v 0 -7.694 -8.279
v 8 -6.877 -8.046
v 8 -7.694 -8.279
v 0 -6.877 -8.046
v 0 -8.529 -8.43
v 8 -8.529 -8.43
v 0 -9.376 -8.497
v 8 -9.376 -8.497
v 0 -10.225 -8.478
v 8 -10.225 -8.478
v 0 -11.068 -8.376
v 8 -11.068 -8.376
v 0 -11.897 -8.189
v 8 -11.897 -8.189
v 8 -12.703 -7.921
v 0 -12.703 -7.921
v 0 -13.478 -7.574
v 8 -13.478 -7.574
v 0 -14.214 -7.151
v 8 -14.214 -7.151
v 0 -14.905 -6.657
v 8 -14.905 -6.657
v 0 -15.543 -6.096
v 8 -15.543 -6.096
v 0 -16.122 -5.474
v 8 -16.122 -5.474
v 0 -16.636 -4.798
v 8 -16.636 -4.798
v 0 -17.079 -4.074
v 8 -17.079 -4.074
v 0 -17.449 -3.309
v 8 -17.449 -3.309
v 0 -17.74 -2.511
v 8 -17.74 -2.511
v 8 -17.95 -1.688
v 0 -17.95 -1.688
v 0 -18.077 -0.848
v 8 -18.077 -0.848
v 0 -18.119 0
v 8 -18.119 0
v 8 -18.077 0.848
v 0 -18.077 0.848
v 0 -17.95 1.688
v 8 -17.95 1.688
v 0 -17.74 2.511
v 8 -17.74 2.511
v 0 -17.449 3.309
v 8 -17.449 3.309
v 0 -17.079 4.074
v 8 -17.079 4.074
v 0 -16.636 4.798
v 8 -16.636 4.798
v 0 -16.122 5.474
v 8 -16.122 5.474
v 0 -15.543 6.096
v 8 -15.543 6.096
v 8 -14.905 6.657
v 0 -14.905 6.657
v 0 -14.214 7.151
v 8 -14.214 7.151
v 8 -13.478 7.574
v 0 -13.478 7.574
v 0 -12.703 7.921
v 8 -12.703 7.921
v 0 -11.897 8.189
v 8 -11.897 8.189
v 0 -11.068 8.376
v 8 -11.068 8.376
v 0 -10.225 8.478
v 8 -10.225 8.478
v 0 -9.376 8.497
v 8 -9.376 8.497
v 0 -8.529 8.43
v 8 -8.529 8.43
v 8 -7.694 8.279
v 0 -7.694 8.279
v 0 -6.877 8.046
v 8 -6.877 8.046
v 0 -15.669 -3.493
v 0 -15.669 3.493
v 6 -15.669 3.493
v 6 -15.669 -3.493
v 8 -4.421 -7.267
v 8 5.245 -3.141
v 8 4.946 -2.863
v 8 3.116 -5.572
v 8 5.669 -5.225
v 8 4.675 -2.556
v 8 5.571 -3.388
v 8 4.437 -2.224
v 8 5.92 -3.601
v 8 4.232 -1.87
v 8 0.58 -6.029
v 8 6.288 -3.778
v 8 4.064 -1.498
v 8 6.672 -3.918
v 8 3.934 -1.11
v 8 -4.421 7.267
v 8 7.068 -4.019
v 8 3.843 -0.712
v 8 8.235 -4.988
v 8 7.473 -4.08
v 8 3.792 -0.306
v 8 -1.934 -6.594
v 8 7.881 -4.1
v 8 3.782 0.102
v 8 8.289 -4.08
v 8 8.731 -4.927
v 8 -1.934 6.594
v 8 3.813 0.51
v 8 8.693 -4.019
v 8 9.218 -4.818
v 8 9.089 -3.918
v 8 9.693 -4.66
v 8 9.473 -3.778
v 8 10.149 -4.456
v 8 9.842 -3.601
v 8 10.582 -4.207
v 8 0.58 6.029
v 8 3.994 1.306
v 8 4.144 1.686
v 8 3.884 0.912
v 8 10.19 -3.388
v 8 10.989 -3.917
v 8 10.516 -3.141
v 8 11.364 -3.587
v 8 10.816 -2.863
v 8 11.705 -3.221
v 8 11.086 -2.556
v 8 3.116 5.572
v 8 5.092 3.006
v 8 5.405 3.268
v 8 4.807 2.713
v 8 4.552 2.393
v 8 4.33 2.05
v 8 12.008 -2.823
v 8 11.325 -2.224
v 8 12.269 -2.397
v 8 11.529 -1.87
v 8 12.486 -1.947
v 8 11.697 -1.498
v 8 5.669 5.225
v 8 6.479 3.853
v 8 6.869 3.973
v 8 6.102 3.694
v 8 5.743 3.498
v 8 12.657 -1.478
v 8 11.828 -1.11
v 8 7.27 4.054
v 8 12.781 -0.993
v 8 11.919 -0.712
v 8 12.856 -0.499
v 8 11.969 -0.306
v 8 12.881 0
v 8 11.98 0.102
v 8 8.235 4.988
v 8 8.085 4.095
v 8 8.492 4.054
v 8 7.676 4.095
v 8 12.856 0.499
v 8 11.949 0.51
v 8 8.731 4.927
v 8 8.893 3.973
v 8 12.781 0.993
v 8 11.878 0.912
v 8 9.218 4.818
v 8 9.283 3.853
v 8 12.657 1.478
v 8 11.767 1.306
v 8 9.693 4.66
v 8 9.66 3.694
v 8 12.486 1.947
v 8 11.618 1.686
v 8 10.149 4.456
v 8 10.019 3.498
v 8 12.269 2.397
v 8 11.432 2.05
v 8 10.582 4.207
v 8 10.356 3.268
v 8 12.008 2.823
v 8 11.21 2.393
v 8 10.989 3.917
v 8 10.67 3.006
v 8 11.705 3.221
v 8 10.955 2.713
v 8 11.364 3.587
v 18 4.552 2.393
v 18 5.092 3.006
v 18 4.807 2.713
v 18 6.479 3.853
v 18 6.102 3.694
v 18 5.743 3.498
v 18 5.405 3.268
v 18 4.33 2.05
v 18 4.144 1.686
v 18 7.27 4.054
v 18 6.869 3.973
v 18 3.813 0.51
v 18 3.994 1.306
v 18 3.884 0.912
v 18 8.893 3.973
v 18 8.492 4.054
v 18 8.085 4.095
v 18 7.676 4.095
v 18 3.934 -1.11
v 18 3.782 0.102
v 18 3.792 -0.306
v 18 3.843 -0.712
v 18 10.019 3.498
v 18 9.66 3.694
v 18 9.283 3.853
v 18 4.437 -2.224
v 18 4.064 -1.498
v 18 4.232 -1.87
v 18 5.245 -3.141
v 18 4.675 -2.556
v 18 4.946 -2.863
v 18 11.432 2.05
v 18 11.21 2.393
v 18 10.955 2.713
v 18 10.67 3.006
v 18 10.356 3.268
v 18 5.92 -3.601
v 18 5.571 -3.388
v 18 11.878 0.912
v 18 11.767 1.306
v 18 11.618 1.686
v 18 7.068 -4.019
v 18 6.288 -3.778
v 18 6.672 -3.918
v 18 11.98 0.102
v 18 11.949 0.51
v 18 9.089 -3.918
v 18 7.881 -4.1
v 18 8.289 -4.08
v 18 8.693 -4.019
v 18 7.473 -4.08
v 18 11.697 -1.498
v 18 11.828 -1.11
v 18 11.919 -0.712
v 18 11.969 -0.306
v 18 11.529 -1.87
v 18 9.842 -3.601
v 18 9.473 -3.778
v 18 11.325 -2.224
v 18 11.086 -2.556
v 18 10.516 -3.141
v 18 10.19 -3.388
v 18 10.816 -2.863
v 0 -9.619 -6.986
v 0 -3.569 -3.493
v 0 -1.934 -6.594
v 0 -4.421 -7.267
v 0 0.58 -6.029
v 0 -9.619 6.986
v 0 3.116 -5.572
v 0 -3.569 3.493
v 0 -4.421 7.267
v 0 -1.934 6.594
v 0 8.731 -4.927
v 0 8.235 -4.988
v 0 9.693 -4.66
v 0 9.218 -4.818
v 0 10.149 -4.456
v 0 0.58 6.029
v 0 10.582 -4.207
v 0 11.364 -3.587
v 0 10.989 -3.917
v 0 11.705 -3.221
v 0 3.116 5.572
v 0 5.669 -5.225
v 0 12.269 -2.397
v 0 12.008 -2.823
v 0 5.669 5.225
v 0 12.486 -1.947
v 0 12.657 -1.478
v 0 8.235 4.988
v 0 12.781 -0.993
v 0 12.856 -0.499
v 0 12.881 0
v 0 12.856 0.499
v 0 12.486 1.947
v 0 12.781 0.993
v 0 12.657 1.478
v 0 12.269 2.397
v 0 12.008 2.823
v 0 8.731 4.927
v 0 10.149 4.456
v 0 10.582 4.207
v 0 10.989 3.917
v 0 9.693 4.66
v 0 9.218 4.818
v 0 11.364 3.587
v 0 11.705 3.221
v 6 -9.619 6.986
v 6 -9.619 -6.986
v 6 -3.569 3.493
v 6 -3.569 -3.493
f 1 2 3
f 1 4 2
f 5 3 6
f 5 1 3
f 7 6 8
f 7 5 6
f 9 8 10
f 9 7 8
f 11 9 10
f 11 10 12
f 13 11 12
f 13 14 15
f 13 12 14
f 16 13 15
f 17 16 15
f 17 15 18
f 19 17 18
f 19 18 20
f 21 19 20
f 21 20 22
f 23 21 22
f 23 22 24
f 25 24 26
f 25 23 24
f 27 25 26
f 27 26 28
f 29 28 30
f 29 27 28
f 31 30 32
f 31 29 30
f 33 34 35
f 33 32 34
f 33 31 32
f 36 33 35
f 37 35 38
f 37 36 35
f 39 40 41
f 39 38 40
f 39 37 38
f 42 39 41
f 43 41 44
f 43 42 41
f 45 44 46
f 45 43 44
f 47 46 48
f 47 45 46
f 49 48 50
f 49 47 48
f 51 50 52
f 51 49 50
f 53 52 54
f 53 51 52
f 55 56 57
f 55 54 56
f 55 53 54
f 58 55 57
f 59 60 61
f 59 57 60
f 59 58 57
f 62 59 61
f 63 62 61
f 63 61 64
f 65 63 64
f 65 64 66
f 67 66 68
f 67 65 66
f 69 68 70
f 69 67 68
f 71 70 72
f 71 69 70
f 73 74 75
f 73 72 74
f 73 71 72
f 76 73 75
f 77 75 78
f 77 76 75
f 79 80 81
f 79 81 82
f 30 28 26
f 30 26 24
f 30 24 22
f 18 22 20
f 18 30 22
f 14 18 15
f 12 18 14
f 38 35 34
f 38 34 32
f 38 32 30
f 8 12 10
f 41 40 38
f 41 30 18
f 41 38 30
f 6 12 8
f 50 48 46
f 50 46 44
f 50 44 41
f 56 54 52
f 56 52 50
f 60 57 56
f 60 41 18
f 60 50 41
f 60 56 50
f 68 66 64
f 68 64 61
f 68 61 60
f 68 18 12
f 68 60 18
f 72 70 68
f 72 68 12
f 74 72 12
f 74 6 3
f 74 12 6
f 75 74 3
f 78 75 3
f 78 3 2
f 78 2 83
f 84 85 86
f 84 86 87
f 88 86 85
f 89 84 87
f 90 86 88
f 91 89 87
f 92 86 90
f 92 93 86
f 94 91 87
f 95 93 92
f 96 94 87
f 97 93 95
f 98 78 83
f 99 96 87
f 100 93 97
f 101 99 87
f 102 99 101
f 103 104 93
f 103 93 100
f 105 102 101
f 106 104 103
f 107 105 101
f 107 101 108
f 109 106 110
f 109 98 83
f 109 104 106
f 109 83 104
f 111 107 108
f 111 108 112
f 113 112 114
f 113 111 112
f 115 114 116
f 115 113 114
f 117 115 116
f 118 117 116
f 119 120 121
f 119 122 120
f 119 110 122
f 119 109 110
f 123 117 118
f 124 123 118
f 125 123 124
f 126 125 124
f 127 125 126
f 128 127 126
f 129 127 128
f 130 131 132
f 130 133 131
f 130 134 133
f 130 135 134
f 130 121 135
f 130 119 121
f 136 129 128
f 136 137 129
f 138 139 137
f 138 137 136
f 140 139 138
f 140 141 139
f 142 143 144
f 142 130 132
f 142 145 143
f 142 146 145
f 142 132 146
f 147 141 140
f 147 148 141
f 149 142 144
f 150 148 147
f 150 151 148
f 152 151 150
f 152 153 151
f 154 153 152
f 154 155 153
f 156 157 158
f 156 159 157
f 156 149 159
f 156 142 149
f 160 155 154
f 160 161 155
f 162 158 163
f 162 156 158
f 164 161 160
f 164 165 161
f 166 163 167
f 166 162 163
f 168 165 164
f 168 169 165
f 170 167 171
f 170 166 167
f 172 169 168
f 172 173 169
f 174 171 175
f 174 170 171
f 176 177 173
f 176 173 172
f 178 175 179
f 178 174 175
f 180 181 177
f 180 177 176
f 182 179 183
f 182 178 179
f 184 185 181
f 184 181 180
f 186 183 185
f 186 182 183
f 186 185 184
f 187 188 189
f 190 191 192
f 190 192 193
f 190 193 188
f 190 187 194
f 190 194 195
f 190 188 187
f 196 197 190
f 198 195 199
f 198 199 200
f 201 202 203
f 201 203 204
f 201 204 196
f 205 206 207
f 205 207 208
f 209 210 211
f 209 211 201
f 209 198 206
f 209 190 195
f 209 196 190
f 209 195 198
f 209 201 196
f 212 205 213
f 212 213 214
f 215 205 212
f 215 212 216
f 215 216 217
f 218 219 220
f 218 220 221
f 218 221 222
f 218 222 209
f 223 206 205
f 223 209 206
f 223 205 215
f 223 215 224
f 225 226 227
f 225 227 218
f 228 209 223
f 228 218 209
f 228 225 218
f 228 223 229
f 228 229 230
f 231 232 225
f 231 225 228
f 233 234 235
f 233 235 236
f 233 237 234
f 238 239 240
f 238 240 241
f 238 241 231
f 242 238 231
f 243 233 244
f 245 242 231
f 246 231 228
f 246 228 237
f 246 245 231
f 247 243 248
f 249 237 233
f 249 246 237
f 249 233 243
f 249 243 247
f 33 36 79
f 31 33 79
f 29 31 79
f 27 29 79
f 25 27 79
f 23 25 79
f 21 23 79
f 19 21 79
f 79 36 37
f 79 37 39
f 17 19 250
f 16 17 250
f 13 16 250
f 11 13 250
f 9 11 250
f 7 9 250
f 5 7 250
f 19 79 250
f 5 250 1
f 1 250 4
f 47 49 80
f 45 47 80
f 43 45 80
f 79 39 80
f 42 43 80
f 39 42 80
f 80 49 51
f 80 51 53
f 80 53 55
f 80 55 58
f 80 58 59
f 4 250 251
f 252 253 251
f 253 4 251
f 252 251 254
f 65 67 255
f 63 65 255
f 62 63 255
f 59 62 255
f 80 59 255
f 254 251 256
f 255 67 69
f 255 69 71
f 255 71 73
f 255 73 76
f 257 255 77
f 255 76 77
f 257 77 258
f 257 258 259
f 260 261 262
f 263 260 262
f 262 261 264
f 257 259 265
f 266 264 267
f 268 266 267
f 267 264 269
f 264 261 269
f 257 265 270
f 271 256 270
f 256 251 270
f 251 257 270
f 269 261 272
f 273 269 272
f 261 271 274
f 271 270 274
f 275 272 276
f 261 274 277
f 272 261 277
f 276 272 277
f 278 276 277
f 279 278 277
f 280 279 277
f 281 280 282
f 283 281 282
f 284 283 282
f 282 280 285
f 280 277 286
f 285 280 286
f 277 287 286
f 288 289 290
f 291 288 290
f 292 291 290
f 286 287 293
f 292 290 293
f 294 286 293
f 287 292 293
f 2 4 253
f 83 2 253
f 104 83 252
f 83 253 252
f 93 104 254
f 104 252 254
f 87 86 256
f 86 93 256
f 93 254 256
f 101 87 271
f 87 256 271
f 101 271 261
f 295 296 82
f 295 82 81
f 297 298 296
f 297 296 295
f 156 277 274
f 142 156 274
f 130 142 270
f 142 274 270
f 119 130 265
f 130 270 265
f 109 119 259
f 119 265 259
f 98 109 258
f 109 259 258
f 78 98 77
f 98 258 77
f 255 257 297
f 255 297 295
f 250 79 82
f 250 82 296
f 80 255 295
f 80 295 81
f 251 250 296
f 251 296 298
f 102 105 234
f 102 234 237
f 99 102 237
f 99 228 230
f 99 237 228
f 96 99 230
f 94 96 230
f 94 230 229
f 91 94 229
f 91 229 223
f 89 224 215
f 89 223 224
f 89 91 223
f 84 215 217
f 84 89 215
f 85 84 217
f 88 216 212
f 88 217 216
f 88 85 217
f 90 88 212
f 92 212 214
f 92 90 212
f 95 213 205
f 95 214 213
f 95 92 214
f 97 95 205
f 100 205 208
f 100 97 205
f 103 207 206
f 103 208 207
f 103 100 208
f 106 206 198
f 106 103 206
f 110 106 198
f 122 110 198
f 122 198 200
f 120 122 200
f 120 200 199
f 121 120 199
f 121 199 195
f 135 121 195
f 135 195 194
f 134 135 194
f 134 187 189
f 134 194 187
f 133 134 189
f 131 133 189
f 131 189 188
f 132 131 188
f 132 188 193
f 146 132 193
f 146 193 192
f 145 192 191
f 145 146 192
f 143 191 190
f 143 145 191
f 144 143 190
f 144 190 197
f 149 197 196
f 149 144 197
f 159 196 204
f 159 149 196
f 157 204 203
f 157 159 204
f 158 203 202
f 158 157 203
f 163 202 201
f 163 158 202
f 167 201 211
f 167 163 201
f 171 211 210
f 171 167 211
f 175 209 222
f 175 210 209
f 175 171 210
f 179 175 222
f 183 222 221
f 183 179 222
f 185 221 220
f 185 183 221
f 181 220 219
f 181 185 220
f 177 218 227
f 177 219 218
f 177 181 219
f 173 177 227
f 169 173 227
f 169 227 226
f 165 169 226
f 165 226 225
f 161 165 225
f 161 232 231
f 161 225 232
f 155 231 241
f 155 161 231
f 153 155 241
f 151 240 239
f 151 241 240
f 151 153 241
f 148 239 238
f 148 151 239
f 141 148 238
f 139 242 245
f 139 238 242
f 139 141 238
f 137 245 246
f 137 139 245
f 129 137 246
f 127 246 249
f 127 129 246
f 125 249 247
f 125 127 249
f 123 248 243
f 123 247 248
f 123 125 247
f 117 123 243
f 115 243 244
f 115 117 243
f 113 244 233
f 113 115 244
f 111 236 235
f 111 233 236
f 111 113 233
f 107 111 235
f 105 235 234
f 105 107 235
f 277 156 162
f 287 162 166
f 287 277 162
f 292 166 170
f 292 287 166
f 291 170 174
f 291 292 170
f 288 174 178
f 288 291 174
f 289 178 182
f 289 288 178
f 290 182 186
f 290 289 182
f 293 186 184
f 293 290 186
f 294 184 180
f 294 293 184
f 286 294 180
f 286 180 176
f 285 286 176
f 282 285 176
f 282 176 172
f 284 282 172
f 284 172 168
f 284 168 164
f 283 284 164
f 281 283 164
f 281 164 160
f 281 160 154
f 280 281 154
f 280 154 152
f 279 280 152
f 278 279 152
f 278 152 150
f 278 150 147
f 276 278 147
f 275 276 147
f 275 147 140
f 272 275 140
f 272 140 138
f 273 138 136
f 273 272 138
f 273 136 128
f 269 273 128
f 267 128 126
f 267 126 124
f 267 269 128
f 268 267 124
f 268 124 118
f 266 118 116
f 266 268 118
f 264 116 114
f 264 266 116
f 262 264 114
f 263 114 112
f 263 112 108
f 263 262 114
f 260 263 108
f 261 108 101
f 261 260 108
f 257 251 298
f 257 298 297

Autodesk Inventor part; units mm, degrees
ref_plane "YZ Plane" through (0, 0, 0) normal (1, 0, 0) x (0, 1, 0)
ref_plane "XZ Plane" through (0, 0, 0) normal (0, 1, 0) x (-1, 0, 0)
ref_plane "XY Plane" through (0, 0, 0) normal (0, 0, 1) x (1, 0, 0)
sketch "Skizze1" plane through (0, 0, 0) normal (1, 0, 0) x (0, 1, 0)
  circle A0 centre (7.8808, 0) radius 5
  circle A1 centre (-9.6192, 0) radius 8.5
  arc A2 (-6.8769, 8.0455) -> (8.2347, 4.9875) centre (12.4808, 64.837) ccw
  arc A3 (8.2347, -4.9875) -> (-6.8769, -8.0455) centre (12.4808, -64.837) ccw
  point P0 (0, 0)
  dimension "d0" = 10
  dimension "d1" = 17
  dimension "d2" = 17.5
  dimension "d3" = 60
  dimension "d4" = 0
  dimension "d5" = 0
  dimension "d6" = 60
extrude "Extrusion1" add sketch "Skizze1" along normal blind 8
sketch "Skizze2" plane through (8, 0, 0) normal (1, 0, 0) x (0, 0, -1)
  arc A0 (4.9875, 8.2347) -> (-4.9875, 8.2347) centre (0, 7.8808) ccw projected
  circle A1 centre (0, 7.8808) radius 4.1
  point P0 (0, 0)
  dimension "d9" = 8.2
extrude "Extrusion2" add sketch "Skizze2" along normal blind 10
sketch "Skizze4" plane through (0, 0, 0) normal (-1, 0, 0) x (0, 0, 1)
  arc A0 (-8.0455, -6.8769) -> (8.0455, -6.8769) centre (0, -9.6192) ccw projected
  line L0 (-6.9859, -9.6192) -> (-3.493, -3.5692)
  line L1 (-3.493, -3.5692) -> (3.493, -3.5692)
  line L2 (3.493, -3.5692) -> (6.9859, -9.6192)
  line L3 (6.9859, -9.6192) -> (3.493, -15.6692)
  line L4 (3.493, -15.6692) -> (-3.493, -15.6692)
  line L5 (-3.493, -15.6692) -> (-6.9859, -9.6192)
  point P0 (0, 0)
  dimension "d15" = 12.1
extrude "Extrusion4" cut sketch "Skizze4" against normal blind 6
properties part number "MotorAnkerNeu"
